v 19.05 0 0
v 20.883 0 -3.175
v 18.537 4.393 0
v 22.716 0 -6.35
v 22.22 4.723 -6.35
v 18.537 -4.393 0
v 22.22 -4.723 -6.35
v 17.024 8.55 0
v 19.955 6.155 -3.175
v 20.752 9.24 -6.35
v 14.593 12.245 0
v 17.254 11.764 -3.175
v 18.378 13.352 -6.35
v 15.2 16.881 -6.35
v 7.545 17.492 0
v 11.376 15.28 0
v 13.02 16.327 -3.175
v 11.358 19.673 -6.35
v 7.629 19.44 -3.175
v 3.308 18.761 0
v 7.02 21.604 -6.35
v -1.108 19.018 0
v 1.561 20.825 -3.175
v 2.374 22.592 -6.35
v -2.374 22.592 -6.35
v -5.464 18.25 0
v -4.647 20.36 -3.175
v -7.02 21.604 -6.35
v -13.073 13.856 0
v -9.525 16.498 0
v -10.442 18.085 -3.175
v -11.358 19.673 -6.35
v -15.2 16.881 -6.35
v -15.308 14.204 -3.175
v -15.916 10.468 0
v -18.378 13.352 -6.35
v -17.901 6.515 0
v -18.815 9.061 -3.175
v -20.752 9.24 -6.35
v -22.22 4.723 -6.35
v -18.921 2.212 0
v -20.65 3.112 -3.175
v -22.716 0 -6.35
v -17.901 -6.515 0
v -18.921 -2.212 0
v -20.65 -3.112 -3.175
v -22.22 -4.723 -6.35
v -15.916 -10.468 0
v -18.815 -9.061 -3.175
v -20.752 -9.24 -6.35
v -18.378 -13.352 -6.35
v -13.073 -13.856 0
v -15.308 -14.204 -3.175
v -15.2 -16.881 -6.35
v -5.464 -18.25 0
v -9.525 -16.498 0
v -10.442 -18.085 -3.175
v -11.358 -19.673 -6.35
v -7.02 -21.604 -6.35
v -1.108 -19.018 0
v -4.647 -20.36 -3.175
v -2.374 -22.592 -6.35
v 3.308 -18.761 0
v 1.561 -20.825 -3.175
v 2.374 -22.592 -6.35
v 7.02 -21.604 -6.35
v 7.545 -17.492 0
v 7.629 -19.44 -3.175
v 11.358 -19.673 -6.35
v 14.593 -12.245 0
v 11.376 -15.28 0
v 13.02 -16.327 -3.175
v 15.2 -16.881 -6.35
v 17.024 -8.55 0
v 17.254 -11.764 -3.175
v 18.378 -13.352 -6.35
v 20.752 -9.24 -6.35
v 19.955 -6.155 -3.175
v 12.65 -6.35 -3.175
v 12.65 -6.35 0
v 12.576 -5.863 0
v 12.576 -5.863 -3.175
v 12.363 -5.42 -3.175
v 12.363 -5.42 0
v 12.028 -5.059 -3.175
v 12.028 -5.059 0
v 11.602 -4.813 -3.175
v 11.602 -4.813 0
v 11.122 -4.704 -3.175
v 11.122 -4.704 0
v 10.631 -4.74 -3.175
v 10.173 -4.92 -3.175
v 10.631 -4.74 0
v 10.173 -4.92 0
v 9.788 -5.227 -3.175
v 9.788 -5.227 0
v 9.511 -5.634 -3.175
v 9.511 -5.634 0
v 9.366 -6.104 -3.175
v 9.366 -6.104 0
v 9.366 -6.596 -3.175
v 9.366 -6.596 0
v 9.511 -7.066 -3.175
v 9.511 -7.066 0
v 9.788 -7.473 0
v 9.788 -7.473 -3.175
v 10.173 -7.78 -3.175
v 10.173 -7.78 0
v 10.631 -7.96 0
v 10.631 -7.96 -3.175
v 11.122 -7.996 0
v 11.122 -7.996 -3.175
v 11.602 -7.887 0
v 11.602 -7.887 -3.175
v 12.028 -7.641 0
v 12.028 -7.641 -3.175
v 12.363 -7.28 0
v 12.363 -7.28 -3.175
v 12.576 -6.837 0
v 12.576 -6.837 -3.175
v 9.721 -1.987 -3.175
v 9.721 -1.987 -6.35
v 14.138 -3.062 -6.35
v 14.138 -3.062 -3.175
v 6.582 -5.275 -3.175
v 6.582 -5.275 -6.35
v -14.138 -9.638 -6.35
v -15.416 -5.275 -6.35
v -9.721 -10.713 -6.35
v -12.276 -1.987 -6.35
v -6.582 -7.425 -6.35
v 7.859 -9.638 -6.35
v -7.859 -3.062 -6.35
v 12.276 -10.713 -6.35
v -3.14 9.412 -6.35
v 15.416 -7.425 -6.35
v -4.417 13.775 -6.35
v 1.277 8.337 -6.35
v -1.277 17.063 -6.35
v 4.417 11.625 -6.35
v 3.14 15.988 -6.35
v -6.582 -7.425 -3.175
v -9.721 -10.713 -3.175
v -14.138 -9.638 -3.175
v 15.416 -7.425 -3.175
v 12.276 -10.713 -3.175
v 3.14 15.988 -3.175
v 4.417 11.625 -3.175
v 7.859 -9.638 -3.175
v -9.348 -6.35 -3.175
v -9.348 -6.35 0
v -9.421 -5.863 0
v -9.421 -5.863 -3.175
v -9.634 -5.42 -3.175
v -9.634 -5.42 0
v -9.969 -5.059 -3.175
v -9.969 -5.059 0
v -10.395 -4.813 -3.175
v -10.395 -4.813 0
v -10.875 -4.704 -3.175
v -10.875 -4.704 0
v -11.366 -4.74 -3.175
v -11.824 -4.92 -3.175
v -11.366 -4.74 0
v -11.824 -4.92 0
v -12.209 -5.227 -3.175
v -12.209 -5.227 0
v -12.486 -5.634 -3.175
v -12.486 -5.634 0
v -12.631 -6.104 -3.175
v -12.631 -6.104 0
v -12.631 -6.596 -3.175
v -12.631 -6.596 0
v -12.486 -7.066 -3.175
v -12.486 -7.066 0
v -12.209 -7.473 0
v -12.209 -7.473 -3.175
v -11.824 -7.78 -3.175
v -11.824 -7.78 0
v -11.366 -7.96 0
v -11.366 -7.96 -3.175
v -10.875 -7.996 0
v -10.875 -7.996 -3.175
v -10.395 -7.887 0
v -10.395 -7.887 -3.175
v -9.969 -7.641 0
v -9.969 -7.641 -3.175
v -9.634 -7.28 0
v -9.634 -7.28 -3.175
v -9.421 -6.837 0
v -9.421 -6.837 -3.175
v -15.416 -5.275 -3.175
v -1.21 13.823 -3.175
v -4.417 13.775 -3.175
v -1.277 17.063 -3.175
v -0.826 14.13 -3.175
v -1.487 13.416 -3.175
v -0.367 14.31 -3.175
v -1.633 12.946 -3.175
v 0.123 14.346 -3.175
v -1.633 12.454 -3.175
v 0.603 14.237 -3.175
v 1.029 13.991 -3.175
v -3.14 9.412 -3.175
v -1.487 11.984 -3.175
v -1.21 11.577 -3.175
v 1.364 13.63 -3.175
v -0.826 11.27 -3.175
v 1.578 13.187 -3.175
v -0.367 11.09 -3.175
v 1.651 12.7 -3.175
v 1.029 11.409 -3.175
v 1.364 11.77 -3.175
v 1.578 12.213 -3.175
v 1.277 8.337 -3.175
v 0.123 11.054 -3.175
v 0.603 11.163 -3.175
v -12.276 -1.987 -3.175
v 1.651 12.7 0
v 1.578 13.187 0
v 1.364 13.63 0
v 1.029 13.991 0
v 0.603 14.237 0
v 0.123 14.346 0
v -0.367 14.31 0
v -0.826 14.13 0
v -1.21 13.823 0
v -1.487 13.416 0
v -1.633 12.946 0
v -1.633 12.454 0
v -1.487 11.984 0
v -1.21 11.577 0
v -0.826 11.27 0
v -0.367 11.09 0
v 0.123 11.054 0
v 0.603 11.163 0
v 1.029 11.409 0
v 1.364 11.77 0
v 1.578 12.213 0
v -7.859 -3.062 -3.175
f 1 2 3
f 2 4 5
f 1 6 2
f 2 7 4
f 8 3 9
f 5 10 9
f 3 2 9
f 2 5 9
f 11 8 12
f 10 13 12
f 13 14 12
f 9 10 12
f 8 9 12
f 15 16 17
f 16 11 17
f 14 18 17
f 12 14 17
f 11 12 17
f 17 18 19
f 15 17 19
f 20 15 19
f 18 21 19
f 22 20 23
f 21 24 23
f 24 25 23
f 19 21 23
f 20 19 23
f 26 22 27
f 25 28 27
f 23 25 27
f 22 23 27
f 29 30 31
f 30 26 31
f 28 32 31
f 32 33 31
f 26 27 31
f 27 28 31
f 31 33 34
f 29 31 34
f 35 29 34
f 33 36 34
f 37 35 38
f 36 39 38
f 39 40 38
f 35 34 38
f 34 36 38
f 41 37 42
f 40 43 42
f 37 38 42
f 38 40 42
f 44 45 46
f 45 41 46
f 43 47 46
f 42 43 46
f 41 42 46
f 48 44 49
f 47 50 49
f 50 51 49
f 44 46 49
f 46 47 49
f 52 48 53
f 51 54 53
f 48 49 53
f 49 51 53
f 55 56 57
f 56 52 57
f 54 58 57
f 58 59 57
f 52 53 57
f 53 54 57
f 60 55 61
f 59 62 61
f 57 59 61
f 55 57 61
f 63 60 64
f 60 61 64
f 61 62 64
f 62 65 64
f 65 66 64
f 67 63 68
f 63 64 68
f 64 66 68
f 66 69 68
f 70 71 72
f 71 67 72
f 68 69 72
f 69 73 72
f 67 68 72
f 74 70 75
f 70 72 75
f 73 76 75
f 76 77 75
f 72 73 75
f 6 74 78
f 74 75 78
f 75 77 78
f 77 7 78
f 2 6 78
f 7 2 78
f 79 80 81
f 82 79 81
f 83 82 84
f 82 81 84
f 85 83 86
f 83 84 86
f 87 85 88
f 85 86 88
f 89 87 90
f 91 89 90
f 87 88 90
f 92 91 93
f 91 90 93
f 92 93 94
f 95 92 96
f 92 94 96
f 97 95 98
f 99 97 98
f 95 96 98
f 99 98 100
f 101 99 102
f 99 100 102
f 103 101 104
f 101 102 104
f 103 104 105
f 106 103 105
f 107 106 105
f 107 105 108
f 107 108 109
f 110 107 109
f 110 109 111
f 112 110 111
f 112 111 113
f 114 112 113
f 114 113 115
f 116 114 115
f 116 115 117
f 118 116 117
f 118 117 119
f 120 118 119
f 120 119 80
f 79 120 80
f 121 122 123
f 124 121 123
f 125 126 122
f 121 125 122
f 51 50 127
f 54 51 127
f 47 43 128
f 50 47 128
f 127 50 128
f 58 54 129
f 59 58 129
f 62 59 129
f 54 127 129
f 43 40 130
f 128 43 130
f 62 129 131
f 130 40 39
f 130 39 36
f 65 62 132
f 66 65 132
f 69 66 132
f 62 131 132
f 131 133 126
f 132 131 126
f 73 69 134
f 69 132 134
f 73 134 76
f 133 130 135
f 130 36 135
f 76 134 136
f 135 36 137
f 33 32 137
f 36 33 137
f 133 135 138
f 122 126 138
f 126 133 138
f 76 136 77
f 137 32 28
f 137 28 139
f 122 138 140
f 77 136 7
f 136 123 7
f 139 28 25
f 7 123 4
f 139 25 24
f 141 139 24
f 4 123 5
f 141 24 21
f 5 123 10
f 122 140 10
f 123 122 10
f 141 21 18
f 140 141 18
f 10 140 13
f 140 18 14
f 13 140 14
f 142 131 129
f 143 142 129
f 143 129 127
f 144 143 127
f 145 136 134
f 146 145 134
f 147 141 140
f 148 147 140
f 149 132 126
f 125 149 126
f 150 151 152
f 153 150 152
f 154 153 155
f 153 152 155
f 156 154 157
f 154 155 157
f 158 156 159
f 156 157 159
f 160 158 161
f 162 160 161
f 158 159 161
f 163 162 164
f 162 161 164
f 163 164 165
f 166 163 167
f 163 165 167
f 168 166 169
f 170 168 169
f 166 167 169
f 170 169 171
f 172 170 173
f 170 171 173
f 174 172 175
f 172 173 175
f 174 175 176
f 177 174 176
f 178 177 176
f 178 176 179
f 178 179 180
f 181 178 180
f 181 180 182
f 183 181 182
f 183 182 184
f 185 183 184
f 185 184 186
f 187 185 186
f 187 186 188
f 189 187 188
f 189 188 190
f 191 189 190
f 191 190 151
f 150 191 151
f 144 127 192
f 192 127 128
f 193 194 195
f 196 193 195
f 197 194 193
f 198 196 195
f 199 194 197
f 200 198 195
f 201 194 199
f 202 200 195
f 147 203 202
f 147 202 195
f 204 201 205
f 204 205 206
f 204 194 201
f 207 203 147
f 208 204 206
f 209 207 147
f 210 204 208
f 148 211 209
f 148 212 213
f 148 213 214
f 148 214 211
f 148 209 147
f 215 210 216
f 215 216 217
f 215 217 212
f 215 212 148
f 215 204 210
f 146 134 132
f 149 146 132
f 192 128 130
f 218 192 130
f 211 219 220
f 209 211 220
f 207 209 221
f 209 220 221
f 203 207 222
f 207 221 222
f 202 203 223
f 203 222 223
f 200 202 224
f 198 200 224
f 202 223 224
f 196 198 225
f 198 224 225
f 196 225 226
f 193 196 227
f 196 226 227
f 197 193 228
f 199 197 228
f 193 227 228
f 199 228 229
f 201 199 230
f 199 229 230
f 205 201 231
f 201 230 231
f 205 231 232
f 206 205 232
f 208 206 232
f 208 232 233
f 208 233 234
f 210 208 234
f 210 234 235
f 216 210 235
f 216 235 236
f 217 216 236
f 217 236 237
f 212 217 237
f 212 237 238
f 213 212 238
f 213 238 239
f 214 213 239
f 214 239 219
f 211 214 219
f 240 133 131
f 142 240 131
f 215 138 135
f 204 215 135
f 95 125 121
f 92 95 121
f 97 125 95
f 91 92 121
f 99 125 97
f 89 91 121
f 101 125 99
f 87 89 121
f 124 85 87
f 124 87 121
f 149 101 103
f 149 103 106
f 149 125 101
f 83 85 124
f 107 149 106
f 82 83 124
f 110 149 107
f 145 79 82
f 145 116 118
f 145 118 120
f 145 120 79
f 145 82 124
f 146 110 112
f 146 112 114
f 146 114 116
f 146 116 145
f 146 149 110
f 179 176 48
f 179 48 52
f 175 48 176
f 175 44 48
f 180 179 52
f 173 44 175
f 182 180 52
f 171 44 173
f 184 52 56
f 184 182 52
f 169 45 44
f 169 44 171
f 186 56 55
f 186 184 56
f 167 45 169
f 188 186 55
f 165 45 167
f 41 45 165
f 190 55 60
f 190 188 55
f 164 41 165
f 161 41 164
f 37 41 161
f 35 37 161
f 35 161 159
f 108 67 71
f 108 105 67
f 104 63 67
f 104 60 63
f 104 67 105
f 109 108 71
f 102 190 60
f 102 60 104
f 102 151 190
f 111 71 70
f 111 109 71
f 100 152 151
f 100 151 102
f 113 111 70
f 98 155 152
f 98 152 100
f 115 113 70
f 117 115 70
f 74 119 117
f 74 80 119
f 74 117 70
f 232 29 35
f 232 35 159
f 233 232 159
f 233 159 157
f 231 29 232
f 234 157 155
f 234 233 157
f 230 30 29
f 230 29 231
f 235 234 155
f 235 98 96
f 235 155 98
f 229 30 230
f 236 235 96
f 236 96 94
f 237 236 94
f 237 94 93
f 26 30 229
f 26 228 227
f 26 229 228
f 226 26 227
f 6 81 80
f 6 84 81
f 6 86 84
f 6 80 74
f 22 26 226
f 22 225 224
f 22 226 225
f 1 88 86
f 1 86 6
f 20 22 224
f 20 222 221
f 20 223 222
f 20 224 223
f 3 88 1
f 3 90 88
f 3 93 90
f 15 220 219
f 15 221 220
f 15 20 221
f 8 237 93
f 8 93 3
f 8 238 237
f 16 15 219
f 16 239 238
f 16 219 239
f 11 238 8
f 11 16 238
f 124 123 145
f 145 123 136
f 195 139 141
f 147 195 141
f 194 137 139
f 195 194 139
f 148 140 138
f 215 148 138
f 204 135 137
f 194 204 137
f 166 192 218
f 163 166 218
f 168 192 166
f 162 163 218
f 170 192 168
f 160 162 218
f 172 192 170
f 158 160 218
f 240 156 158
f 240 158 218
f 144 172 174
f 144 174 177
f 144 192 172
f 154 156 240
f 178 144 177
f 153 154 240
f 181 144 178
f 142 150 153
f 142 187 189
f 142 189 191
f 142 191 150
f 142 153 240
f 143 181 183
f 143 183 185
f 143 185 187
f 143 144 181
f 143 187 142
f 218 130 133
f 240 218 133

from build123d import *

# Parameters (mm, degrees)
F0_R     = 19.05
F1_DEPTH = 6.35
F1_TAPER = -30
F2_R     = 1.651
F3_DEPTH = 25.4
F5_DEPTH = 3.175


with BuildPart() as f1:
    # F0 (on Top) → F1 (new body)
    with BuildSketch(Plane.XY):
        Circle(F0_R)
    extrude(amount=-F1_DEPTH, taper=F1_TAPER)

    # F2 (on face) → F3 (cut)
    with BuildSketch(Plane.XY):
        with Locations((0, 12.7)):
            Circle(F2_R)
        with Locations((-10.9985226281, -6.35)):
            Circle(F2_R)
        with Locations((10.9985226281, -6.35)):
            Circle(F2_R)
    extrude(amount=-F3_DEPTH, mode=Mode.SUBTRACT)

    # F4 (on face) → F5 (cut)
    with BuildSketch(Plane(origin=(0, 0, -6.35), x_dir=(1, 0, 0), z_dir=(0, 0, -1))):
        Polygon((4.4170216301, -11.6245720608), (1.2771628997, -8.3370330896), (-3.1398587304, -9.4124610289), (-4.4170216301, -13.7754279392), (-1.2771628997, -17.0629669104), (3.1398587304, -15.9875389711), align=None)
        Polygon((9.7213597283, 1.9870330896), (14.1383813584, 3.0624610289), (15.4155442582, 7.4254279392), (12.2756855278, 10.7129669104), (7.8586638977, 9.6375389711), (6.581500998, 5.2745720608), align=None)
        Polygon((-6.581500998, 7.4254279392), (-9.7213597283, 10.7129669104), (-14.1383813584, 9.6375389711), (-15.4155442582, 5.2745720608), (-12.2756855278, 1.9870330896), (-7.8586638977, 3.0624610289), align=None)
    extrude(amount=-F5_DEPTH, mode=Mode.SUBTRACT)


solid = f1.part
